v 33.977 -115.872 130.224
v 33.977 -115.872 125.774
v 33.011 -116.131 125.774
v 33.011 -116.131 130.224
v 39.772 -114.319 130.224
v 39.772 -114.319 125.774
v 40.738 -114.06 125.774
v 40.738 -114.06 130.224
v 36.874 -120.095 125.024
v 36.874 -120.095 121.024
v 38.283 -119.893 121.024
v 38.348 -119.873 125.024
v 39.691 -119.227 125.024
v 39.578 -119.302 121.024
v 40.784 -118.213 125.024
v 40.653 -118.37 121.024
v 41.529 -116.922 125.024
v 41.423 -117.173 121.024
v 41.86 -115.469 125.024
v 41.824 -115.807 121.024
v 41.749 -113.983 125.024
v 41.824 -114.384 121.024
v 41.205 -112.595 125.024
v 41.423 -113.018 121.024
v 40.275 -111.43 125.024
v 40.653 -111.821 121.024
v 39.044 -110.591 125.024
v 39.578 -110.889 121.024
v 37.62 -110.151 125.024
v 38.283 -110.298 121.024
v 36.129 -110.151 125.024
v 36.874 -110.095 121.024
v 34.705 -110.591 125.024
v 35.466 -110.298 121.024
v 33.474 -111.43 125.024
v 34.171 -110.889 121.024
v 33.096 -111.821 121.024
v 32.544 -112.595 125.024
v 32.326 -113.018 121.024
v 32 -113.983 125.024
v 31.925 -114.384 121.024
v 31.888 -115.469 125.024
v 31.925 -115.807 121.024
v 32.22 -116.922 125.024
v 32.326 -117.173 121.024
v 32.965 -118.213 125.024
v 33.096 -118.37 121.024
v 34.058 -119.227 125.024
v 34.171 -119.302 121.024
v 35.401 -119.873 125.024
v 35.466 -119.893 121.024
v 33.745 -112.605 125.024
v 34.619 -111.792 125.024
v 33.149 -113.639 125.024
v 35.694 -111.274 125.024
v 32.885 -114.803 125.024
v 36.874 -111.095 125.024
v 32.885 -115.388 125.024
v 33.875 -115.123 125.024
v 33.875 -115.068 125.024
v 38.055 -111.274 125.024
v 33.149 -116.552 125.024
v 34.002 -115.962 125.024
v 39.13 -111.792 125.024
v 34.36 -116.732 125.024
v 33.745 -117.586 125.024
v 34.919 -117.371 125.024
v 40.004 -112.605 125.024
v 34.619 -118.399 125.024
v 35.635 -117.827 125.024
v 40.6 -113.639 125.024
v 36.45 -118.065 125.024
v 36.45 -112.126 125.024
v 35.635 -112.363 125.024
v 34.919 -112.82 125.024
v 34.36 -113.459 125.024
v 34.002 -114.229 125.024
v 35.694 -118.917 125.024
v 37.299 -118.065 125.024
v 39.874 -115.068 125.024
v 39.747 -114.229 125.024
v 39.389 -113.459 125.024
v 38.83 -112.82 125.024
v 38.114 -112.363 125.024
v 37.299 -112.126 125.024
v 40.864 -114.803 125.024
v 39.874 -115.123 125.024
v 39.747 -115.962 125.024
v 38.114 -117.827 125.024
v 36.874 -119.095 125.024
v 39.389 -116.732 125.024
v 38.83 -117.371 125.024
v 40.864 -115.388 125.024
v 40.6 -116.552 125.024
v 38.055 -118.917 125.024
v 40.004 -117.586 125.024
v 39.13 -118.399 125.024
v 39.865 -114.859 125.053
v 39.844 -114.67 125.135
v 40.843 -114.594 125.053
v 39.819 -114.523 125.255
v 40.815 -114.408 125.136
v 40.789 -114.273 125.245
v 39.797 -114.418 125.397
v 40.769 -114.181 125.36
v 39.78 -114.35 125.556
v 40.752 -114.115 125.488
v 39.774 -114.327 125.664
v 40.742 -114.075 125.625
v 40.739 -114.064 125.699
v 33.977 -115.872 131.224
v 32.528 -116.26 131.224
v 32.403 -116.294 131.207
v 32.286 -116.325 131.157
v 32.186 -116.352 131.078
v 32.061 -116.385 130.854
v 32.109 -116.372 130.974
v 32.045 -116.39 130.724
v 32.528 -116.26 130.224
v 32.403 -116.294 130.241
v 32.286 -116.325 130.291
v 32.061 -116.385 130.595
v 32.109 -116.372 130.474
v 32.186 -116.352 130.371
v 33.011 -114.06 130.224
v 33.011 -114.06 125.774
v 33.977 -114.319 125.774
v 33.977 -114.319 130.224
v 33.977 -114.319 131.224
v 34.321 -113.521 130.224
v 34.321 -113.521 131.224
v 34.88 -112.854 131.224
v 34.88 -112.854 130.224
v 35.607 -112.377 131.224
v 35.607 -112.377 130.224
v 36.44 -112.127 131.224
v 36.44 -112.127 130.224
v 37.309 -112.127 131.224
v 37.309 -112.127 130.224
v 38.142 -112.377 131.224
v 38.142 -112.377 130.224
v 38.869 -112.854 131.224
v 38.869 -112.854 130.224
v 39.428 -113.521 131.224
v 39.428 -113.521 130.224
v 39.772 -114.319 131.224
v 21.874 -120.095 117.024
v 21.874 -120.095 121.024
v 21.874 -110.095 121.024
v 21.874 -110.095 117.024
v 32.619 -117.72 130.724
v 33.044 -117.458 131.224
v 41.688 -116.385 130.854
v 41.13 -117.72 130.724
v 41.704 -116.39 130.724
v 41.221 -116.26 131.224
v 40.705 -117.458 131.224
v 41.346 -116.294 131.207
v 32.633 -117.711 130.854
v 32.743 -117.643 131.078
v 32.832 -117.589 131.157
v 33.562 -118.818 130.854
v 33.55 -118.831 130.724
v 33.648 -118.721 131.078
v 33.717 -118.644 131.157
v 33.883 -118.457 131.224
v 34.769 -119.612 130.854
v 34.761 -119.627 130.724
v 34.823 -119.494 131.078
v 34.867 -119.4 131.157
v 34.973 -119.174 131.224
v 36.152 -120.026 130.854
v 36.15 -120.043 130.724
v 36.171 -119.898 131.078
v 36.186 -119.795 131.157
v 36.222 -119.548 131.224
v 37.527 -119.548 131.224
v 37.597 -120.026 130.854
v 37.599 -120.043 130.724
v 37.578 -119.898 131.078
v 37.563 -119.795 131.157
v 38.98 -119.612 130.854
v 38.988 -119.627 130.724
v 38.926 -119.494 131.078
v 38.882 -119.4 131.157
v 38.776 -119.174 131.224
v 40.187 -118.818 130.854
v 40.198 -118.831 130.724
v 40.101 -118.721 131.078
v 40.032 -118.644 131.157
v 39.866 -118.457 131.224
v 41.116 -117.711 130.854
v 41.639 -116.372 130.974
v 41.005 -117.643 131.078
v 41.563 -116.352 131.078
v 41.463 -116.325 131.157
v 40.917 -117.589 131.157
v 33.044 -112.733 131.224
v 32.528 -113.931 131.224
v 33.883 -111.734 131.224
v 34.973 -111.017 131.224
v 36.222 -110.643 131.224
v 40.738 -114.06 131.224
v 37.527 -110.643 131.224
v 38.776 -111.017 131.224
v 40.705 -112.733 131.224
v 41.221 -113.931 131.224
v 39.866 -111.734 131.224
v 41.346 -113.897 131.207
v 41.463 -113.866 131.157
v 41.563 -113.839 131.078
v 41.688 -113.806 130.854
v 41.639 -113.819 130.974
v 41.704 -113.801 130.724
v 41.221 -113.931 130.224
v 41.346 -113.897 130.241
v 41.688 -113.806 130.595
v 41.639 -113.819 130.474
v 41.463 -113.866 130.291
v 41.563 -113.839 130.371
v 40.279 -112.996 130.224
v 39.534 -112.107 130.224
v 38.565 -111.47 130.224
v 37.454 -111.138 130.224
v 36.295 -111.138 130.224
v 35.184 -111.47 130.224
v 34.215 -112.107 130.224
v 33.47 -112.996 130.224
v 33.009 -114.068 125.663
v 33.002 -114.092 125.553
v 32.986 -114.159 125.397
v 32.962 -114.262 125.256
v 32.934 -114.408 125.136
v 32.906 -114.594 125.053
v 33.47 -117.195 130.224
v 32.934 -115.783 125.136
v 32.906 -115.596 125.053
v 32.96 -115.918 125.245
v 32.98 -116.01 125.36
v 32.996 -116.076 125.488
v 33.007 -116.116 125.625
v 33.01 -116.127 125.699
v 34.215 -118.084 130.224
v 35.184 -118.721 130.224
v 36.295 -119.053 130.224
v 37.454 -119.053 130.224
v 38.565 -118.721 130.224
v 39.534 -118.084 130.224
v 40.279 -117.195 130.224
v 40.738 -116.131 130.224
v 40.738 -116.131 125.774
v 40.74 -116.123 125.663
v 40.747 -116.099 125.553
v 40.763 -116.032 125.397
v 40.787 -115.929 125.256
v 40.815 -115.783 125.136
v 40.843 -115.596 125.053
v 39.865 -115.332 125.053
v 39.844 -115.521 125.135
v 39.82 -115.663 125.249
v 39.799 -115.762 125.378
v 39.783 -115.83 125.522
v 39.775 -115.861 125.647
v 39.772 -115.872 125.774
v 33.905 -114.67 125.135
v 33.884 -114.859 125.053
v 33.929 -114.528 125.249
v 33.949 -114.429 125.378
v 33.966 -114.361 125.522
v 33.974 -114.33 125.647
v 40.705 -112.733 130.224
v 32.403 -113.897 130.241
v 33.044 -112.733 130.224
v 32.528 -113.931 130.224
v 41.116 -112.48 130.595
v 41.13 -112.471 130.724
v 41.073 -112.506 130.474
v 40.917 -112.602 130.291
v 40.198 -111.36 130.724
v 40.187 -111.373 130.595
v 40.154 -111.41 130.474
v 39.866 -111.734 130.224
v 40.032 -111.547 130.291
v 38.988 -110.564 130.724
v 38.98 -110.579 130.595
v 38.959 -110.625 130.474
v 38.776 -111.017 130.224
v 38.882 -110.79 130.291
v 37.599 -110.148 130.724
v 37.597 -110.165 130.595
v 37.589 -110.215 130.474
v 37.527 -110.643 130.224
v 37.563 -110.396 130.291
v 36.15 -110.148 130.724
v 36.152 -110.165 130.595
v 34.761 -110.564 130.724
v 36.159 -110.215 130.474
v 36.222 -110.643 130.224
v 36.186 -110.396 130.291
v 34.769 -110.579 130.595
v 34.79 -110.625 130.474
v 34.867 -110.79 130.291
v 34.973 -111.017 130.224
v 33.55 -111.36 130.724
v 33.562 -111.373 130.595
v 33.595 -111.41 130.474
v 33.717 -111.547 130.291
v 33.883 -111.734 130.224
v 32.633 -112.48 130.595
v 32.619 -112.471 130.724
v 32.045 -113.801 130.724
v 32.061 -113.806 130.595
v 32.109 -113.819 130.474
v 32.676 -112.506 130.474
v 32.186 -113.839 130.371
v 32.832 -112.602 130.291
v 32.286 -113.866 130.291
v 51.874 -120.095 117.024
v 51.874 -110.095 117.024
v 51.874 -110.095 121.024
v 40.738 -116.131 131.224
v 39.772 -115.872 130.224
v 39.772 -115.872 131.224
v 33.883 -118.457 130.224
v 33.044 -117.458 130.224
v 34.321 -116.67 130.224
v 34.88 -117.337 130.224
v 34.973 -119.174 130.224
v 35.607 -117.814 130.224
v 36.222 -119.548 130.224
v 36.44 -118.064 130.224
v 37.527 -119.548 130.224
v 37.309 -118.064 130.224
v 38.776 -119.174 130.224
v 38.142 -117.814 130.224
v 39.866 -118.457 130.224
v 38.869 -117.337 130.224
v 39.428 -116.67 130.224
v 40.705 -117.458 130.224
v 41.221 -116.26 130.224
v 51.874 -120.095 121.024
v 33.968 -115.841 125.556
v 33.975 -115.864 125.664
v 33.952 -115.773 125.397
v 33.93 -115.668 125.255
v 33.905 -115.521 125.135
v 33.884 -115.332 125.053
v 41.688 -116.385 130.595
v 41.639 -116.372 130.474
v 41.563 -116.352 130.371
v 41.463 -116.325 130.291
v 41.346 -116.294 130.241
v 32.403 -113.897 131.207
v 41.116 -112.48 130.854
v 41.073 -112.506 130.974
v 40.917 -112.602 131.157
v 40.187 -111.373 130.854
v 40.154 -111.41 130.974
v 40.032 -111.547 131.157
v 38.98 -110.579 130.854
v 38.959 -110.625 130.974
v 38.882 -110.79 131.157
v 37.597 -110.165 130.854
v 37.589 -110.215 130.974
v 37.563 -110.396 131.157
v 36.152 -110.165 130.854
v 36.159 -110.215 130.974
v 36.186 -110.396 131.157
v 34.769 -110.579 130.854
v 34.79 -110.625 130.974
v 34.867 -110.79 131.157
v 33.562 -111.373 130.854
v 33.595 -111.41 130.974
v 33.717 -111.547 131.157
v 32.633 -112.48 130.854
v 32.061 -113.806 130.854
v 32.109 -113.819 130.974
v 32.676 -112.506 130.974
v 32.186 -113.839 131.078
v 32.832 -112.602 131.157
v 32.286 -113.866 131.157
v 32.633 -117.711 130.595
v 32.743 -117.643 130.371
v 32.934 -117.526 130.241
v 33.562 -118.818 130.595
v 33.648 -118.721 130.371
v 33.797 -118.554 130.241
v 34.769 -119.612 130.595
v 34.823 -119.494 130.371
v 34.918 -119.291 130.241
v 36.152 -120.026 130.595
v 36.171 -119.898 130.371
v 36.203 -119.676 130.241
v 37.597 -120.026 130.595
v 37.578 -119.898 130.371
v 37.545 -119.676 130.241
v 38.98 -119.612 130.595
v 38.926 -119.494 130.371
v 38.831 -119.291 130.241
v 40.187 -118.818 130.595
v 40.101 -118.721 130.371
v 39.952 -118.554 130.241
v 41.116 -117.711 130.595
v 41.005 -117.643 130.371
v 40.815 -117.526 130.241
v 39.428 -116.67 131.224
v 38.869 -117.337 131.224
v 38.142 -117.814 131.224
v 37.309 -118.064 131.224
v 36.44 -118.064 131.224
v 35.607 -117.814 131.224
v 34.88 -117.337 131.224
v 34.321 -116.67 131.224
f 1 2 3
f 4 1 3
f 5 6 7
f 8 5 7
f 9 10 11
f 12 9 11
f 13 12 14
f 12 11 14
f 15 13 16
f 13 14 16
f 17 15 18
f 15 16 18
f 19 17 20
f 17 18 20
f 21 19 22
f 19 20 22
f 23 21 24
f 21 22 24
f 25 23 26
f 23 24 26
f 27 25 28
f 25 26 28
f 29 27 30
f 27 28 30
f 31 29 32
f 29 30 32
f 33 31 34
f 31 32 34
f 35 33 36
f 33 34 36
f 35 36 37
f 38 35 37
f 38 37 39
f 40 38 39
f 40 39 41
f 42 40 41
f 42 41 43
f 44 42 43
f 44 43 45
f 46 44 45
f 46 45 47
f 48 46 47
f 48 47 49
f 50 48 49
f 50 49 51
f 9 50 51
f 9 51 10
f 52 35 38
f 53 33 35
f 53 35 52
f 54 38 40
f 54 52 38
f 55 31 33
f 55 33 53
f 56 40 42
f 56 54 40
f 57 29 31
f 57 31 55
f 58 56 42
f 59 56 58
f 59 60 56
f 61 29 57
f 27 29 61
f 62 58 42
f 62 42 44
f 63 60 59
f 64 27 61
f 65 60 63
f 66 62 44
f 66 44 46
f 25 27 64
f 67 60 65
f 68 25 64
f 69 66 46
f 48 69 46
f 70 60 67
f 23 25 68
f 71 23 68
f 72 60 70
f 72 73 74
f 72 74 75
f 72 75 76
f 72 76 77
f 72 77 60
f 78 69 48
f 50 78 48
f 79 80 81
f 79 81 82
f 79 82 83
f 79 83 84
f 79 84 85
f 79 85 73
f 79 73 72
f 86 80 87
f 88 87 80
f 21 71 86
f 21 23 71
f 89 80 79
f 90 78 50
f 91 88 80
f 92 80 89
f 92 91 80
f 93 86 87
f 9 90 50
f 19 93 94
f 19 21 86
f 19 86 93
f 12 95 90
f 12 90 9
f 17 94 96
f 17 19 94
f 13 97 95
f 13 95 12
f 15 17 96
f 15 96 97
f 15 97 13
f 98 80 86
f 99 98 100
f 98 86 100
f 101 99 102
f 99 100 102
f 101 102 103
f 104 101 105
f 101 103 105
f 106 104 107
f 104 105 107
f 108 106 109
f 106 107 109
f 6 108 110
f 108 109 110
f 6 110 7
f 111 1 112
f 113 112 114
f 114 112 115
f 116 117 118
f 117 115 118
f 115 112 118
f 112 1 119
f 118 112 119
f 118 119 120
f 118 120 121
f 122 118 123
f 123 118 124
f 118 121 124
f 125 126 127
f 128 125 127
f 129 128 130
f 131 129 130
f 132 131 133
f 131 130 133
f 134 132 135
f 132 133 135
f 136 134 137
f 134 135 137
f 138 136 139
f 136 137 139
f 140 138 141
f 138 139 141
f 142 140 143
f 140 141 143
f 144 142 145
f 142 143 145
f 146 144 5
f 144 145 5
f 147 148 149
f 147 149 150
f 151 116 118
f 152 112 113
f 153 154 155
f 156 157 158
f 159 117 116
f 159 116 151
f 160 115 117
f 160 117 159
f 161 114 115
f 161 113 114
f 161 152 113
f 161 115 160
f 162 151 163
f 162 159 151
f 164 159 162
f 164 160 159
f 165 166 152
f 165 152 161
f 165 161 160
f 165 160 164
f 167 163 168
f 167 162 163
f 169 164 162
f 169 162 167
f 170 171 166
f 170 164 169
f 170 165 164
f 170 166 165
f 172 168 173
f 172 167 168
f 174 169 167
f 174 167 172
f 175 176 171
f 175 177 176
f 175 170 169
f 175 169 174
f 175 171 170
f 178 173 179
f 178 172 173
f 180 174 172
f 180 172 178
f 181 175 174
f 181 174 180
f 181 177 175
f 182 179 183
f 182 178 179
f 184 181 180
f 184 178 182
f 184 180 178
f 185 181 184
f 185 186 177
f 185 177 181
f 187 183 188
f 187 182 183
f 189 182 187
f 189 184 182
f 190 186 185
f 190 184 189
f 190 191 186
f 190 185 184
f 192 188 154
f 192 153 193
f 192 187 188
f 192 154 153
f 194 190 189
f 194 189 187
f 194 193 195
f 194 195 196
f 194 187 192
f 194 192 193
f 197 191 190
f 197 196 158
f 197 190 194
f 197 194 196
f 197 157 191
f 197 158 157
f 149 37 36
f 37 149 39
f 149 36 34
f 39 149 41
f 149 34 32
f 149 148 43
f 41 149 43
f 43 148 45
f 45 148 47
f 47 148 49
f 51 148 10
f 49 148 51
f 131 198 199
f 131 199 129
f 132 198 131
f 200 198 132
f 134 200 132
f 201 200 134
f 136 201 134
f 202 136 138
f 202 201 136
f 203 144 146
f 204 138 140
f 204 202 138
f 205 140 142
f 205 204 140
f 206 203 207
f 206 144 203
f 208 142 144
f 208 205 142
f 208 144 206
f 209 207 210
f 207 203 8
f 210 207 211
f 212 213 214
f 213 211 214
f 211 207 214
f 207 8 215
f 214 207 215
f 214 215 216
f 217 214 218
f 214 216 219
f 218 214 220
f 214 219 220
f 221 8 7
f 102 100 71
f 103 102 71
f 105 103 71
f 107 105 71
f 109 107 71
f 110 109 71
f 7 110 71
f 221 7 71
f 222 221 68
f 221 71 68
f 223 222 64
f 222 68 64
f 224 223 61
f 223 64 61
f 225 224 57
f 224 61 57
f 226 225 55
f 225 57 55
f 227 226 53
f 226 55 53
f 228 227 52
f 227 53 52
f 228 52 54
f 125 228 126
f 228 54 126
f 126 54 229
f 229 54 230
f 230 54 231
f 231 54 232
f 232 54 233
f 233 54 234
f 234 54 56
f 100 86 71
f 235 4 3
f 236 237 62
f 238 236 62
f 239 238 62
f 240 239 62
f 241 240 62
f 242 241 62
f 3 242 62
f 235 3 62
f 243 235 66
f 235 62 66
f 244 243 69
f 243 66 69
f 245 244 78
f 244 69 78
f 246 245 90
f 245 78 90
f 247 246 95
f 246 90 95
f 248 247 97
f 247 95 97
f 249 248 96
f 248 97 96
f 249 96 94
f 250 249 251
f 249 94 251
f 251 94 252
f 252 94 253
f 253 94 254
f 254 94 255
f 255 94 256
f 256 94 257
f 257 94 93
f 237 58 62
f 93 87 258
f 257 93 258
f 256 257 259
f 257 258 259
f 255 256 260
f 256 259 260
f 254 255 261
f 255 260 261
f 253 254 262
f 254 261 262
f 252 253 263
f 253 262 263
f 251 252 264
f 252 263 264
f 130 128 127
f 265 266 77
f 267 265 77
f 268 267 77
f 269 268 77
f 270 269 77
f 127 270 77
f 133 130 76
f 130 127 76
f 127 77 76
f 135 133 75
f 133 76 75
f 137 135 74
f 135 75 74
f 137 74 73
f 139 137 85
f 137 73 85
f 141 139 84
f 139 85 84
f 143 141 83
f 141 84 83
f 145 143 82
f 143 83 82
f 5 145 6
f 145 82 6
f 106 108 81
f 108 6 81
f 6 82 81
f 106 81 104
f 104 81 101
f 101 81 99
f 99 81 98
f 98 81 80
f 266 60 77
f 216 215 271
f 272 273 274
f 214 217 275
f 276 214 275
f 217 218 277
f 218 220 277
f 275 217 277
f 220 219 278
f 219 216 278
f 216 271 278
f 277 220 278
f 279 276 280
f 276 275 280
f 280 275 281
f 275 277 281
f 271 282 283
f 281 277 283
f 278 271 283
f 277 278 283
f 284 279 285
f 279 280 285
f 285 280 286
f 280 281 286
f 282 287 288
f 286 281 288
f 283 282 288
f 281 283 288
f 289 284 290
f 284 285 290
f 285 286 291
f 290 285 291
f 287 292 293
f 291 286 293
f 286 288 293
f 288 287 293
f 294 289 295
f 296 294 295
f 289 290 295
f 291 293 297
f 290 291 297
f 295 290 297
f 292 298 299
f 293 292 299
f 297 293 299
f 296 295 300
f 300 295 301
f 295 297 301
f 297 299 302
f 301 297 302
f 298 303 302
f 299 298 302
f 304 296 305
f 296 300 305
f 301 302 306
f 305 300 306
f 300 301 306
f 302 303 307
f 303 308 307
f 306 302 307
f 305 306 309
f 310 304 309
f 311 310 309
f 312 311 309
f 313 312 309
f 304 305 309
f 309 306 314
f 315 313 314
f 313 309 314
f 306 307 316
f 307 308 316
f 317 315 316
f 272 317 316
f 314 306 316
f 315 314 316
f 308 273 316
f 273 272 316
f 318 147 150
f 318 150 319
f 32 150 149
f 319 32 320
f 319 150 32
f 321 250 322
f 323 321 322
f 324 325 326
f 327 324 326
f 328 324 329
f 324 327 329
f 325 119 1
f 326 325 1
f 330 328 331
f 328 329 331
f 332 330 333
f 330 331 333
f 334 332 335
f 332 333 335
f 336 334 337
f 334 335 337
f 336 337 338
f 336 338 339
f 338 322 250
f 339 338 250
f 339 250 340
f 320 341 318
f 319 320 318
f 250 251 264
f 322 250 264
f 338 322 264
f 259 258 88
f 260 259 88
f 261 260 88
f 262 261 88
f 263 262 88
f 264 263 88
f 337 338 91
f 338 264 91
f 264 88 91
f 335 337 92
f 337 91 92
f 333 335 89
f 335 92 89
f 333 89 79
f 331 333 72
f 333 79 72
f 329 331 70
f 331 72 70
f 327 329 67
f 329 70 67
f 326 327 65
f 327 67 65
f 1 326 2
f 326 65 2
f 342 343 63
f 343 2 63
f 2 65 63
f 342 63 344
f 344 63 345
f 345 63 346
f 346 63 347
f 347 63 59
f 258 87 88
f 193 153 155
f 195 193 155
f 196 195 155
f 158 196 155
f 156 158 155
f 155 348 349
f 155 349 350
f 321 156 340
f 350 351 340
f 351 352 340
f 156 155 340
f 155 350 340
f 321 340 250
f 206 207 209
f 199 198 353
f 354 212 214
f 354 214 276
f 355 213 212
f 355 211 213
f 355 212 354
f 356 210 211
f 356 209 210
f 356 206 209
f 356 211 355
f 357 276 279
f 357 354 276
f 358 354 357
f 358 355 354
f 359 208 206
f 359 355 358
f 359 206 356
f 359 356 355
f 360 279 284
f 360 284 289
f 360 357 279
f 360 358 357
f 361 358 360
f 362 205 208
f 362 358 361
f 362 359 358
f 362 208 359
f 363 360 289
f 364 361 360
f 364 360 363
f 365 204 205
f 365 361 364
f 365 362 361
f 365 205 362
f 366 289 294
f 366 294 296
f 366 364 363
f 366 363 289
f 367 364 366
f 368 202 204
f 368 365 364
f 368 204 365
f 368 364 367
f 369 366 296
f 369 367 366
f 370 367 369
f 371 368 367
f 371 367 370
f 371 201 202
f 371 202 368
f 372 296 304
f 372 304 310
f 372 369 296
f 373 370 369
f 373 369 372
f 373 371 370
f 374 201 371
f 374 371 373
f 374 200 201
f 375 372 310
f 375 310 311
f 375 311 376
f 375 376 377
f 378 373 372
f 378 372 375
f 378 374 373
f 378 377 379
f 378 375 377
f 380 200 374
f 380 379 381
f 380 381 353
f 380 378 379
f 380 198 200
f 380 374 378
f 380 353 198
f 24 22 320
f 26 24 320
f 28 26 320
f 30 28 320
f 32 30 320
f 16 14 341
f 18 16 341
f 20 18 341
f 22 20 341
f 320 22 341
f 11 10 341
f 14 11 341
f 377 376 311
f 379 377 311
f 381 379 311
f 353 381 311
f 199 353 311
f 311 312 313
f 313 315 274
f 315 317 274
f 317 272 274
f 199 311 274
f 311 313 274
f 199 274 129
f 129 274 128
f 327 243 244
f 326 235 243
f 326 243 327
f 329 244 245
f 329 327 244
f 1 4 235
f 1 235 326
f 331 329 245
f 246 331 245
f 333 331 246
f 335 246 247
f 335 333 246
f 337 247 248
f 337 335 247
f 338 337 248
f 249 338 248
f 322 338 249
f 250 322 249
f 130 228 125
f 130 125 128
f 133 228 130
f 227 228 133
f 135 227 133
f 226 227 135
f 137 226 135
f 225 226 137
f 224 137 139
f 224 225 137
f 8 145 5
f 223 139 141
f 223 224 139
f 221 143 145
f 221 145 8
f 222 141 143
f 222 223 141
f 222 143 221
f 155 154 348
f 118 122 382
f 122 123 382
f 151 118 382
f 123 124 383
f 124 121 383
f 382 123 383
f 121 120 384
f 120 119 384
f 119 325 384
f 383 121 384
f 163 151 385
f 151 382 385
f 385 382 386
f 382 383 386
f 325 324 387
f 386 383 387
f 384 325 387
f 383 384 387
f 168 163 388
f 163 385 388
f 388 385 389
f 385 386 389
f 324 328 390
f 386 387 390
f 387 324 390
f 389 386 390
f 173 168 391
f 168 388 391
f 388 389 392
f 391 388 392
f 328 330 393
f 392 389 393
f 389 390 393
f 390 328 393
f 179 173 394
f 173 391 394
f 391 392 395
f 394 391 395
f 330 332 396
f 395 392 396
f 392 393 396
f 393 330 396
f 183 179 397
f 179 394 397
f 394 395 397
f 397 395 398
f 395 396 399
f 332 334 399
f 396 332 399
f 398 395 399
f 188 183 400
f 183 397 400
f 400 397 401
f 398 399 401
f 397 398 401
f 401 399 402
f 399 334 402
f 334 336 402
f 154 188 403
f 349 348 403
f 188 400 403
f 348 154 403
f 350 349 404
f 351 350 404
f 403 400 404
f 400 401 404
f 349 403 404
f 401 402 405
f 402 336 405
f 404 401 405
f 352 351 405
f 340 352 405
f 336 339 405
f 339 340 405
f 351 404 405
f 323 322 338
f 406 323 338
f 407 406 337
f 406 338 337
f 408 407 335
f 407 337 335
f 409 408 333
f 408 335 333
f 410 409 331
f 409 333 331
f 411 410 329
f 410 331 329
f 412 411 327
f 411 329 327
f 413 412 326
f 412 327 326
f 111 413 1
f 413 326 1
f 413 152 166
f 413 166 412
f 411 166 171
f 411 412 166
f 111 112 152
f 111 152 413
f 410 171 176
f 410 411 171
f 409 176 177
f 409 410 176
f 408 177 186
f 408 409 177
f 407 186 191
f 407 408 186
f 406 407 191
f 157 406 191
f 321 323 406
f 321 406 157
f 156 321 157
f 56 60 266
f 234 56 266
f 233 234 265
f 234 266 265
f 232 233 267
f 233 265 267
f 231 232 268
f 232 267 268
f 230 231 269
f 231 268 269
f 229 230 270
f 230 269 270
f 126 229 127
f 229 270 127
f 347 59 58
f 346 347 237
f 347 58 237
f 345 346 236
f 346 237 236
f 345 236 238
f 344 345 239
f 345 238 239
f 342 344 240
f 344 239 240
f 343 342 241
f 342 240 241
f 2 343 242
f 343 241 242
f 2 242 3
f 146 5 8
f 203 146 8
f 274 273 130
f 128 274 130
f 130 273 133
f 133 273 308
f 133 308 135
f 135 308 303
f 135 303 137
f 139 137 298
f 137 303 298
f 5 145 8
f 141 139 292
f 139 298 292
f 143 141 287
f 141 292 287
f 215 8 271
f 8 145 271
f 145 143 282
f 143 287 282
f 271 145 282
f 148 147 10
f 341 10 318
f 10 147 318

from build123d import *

# Parameters (mm, degrees)
SKETCH1_W             = 30
SKETCH1_H             = 4
BOSS_EXTRUDE1_DEPTH   = 10
SKETCH2_R             = 5
SKETCH2_R_2           = 4
BOSS_EXTRUDE2_DEPTH   = 4
BOSS_EXTRUDE3_DEPTH   = 5.2
BOSS_EXTRUDE5_DEPTH   = 1
BOSS_EXTRUDE5_2_DEPTH = 1
FILLET2_R             = 0.75
FILLET3_R             = 0.5
FILLET4_R             = 0.5


with BuildPart() as part:
    # Sketch1 → Boss-Extrude1 (new body)
    with BuildSketch(Plane(origin=(0, -120.095456241, 0), x_dir=(1, 0, 0), z_dir=(0, 1, 0))):
        with Locations((36.874415609, -119.024132807)):
            Rectangle(SKETCH1_W, SKETCH1_H)
    extrude(amount=BOSS_EXTRUDE1_DEPTH)

    # Sketch2 → Boss-Extrude2 (add)
    # profile 1 of 2: a face of its own
    with BuildSketch(Plane.XY.offset(121.024132807)):
        with Locations(Location((36.874415609, -115.095456241, 0), (0, 0, 270))):
            Circle(SKETCH2_R)
        with Locations((36.874415609, -115.095456241)):
            Circle(SKETCH2_R_2, mode=Mode.SUBTRACT)
    # profile 2 of 2: a face of its own
    with BuildSketch(Plane.XY.offset(121.024132807)):
        with Locations((36.874415609, -115.095456241)):
            Circle(SKETCH2_R_2)
    extrude(amount=BOSS_EXTRUDE2_DEPTH)

    # Sketch3 → Boss-Extrude3 (add)
    with BuildSketch(Plane.XY.offset(125.024132807)):
        with BuildLine():
            ThreePointArc((33.97663813, -114.318999106), (36.874415609, -112.095456241), (39.772193088, -114.318999106))
            Line((39.772193088, -114.318999106), (40.738118914, -114.060180061))
            ThreePointArc((40.738118914, -114.060180061), (36.874415609, -111.095456241), (33.010712304, -114.060180061))
            Line((33.010712304, -114.060180061), (33.97663813, -114.318999106))
        make_face()
        with BuildLine():
            Line((40.738118914, -116.130732422), (39.772193088, -115.871913377))
            ThreePointArc((39.772193088, -115.871913377), (36.874415609, -118.095456241), (33.97663813, -115.871913377))
            Line((33.97663813, -115.871913377), (33.010712304, -116.130732422))
            ThreePointArc((33.010712304, -116.130732422), (36.874415609, -119.095456241), (40.738118914, -116.130732422))
        make_face()
    extrude(amount=BOSS_EXTRUDE3_DEPTH)

    # Fillet2
    fillet2_edges = [part.edges().sort_by_distance(p)[0] for p in [
        (40.255156001, -114.189589584, 125.024132807),
        (33.493675217, -114.189589584, 125.024132807),
        (40.255156001, -116.001322899, 125.024132807),
        (33.493675217, -116.001322899, 125.024132807),
    ]]
    fillet(fillet2_edges, radius=FILLET2_R)


with BuildPart() as body_2:
    # Sketch5 → Boss-Extrude5 (new body)
    with BuildSketch(Plane.XY.offset(130.224132807)):
        with BuildLine():
            Line((33.010712304, -114.060180061), (33.97663813, -114.318999106))
            ThreePointArc((33.97663813, -114.318999106), (36.874415609, -112.095456241), (39.772193088, -114.318999106))
            Line((39.772193088, -114.318999106), (40.738118914, -114.060180061))
            Line((40.738118914, -114.060180061), (41.704044741, -113.801361016))
            ThreePointArc((41.704044741, -113.801361016), (36.874415609, -110.095456241), (32.044786478, -113.801361016))
            Line((32.044786478, -113.801361016), (33.010712304, -114.060180061))
        make_face()
    extrude(amount=BOSS_EXTRUDE5_DEPTH)

    # Fillet3
    fillet3_edges = [body_2.edges().sort_by_distance(p)[0] for p in [
        (36.874415609, -110.095456241, 130.224132807),
        (36.874415609, -110.095456241, 131.224132807),
    ]]
    fillet(fillet3_edges, radius=FILLET3_R - 0.0001)  # a hair under: the kernel refuses the full size


with BuildPart() as body_3:
    # Sketch5 → Boss-Extrude5 2 (new body)
    with BuildSketch(Plane.XY.offset(130.224132807)):
        with BuildLine():
            ThreePointArc((39.772193088, -115.871913377), (36.874415609, -118.095456241), (33.97663813, -115.871913377))
            Line((33.97663813, -115.871913377), (33.010712304, -116.130732422))
            Line((33.010712304, -116.130732422), (32.044786478, -116.389551467))
            ThreePointArc((32.044786478, -116.389551467), (36.874415609, -120.095456241), (41.704044741, -116.389551467))
            Line((41.704044741, -116.389551467), (40.738118914, -116.130732422))
            Line((40.738118914, -116.130732422), (39.772193088, -115.871913377))
        make_face()
    extrude(amount=BOSS_EXTRUDE5_2_DEPTH)

    # Fillet4
    fillet4_edges = [body_3.edges().sort_by_distance(p)[0] for p in [
        (36.874415609, -120.095456241, 130.224132807),
        (36.874415609, -120.095456241, 131.224132807),
    ]]
    fillet(fillet4_edges, radius=FILLET4_R - 0.0001)  # a hair under: the kernel refuses the full size


solid = Compound([part.part, body_2.part, body_3.part])
